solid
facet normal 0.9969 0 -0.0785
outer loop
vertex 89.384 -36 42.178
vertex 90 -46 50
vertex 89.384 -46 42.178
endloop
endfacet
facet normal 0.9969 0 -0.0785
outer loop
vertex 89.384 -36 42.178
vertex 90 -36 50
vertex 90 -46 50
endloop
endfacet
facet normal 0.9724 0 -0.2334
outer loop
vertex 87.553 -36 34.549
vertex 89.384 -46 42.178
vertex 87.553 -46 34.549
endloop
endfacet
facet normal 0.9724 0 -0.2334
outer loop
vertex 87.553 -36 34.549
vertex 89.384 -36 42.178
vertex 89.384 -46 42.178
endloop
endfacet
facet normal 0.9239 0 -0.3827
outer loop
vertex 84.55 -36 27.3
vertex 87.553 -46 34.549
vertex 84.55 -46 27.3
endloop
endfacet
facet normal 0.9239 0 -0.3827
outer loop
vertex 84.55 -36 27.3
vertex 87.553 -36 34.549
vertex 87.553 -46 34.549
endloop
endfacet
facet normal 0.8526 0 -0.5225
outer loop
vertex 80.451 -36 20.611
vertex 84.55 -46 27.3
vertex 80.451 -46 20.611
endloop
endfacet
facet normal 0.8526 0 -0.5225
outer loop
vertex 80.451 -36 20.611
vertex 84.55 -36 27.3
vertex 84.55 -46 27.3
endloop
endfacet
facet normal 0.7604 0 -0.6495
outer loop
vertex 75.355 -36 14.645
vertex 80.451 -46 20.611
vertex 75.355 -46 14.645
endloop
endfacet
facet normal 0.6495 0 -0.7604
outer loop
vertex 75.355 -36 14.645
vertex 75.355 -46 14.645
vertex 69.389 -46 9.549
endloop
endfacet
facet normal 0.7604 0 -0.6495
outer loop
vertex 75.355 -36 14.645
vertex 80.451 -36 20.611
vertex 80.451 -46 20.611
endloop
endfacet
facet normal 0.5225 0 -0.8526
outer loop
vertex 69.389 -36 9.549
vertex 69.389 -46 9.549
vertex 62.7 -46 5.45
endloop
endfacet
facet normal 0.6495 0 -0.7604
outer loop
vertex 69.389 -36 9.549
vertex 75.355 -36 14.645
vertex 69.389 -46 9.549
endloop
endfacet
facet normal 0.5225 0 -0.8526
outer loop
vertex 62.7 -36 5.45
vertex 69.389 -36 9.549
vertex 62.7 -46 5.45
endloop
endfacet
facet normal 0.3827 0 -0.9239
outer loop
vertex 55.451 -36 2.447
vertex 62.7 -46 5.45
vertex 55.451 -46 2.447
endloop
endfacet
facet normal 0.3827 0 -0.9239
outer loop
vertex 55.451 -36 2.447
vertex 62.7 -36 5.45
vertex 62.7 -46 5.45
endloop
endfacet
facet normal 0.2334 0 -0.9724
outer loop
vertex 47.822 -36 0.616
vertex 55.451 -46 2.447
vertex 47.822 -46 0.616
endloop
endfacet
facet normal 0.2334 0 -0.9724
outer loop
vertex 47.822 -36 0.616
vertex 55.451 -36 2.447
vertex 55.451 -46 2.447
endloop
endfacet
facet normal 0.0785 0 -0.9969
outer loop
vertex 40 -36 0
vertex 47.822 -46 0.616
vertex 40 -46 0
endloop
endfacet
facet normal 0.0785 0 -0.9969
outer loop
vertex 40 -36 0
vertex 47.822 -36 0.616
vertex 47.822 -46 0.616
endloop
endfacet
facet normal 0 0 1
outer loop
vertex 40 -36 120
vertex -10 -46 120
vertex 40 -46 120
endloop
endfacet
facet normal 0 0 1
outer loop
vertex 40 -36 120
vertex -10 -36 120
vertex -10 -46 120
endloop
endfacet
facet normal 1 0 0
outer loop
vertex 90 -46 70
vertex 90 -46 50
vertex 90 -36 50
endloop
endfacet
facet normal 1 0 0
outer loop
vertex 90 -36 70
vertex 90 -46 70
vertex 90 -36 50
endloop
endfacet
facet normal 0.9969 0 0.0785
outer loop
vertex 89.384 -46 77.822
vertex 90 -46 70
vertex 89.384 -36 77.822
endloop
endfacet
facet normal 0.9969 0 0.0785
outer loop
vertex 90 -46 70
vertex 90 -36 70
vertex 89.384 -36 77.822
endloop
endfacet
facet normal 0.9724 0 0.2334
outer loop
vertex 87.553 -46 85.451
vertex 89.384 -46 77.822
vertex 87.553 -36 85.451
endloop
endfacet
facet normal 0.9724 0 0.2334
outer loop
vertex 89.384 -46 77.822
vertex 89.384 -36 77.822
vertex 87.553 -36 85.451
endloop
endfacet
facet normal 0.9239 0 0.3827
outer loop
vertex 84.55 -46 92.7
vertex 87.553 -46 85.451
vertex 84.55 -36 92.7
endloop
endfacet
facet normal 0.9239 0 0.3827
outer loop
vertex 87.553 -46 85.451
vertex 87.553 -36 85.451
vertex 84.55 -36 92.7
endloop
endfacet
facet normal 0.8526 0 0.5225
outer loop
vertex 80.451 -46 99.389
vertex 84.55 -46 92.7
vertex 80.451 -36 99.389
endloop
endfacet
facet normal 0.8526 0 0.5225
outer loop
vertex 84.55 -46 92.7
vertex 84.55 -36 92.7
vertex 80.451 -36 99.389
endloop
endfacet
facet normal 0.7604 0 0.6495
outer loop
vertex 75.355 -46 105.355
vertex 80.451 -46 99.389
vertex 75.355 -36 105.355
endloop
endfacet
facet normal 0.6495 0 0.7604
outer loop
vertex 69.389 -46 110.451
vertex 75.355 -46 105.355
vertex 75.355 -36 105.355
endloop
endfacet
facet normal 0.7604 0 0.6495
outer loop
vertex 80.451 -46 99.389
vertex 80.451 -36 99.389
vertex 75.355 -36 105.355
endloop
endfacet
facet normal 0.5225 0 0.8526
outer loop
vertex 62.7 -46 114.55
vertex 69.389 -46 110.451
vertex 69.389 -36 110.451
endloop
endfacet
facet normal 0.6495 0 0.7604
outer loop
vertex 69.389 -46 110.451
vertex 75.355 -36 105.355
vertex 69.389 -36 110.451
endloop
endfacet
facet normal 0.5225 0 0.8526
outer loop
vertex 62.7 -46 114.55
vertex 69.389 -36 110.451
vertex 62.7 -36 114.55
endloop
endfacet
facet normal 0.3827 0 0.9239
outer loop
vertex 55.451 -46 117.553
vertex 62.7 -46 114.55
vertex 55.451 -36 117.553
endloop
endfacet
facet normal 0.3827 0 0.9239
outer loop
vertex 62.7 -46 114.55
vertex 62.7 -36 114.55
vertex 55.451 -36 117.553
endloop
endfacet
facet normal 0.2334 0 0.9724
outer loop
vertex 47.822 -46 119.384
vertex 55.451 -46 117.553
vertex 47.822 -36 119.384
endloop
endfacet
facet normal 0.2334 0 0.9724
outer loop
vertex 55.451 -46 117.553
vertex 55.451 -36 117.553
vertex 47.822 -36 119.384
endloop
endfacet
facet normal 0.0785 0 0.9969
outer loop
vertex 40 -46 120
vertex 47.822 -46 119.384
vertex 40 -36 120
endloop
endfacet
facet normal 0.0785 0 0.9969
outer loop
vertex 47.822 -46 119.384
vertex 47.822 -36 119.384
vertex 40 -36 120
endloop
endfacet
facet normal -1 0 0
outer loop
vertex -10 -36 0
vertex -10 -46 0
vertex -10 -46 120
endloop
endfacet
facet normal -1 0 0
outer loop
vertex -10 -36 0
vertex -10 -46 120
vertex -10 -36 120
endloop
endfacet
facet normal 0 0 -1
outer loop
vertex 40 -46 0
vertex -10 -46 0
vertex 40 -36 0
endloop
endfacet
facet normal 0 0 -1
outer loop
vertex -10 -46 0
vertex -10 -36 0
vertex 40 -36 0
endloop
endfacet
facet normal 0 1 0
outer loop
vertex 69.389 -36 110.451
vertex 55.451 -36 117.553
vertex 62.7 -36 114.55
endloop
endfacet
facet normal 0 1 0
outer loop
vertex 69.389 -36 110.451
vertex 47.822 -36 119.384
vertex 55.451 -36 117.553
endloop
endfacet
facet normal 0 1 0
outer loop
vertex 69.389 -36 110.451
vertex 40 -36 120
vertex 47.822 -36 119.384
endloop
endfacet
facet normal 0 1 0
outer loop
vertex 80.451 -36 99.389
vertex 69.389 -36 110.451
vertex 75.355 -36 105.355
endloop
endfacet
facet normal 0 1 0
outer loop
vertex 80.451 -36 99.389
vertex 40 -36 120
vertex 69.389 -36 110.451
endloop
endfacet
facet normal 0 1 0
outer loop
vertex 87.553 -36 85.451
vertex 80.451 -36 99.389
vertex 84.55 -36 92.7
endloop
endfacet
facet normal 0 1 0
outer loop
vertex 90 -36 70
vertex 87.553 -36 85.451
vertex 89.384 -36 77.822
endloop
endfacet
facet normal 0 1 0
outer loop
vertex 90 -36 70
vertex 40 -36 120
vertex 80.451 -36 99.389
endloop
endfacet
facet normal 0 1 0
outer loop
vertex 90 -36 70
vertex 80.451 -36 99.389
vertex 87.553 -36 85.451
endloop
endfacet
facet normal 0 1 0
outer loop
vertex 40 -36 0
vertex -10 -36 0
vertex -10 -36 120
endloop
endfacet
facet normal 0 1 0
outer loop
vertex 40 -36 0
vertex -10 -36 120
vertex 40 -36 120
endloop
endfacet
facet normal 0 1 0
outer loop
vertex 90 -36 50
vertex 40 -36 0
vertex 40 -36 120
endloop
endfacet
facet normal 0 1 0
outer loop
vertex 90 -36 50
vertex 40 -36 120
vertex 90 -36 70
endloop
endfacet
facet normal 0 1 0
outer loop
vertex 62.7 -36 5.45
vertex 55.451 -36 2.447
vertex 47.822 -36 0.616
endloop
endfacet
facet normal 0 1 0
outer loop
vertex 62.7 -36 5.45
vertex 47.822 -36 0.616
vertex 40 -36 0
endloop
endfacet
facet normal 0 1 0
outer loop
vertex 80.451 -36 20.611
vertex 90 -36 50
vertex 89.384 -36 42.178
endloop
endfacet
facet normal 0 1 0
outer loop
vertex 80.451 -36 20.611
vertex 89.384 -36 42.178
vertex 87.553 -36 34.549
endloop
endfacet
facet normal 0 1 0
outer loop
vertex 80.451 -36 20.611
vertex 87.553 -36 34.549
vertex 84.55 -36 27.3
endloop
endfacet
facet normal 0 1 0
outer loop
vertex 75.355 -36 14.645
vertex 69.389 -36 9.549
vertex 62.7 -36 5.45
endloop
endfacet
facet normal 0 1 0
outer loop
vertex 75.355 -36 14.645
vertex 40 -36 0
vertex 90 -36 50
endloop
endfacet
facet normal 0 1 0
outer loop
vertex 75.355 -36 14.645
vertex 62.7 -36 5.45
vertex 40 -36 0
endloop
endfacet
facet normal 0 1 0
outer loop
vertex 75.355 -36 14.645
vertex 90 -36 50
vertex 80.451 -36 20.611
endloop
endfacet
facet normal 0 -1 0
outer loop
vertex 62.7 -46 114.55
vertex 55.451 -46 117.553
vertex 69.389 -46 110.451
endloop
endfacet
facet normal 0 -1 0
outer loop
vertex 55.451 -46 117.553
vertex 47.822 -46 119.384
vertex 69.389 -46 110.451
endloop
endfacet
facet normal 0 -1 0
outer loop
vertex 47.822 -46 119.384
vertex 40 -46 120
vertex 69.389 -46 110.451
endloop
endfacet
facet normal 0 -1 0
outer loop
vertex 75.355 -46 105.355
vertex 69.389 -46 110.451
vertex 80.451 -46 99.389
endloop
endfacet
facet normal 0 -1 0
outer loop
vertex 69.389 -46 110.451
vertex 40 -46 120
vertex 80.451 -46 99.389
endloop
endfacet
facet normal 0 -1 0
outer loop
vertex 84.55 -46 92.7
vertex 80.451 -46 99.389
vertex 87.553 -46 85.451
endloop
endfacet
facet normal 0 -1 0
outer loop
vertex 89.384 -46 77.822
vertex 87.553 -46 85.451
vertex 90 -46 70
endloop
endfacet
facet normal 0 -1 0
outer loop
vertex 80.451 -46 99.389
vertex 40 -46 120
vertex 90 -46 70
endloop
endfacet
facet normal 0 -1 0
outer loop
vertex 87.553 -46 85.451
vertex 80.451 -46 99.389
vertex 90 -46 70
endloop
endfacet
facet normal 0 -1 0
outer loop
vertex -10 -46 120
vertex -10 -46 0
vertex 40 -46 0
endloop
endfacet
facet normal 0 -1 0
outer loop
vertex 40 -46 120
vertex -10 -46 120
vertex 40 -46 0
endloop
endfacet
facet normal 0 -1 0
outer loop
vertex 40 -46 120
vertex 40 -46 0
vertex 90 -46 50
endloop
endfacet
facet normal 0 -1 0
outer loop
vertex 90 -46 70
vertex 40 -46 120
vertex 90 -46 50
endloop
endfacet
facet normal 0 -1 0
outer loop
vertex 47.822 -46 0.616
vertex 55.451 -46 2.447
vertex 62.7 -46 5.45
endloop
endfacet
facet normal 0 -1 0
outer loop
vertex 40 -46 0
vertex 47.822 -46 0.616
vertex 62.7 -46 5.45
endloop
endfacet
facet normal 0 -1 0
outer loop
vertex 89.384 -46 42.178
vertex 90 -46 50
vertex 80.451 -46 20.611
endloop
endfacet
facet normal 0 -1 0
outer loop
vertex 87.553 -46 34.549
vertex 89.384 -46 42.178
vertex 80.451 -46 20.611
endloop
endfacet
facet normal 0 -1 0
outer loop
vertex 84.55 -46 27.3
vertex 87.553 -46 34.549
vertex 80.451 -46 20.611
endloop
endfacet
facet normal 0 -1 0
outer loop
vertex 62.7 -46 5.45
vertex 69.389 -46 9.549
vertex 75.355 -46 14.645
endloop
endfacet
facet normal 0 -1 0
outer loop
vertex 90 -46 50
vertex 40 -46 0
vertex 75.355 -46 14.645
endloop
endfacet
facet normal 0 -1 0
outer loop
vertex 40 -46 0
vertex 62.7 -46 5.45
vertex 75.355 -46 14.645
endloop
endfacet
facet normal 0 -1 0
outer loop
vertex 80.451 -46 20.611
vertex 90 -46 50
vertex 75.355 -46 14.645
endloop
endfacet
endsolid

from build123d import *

# Parameters (mm, degrees)
BOX014_W     = 100
BOX014_H     = 10
BOX014_DEPTH = 120
FILLET_R     = 50
FILLET001_R  = 50


with BuildPart() as part:
    # Box014 → Box014 (new body)
    with BuildSketch(Plane(origin=(-10, -46, 0), x_dir=(1, 0, 0), z_dir=(0, 0, 1))):
        with Locations((50, 5)):
            Rectangle(BOX014_W, BOX014_H)
    extrude(amount=BOX014_DEPTH)

    # Fillet
    fillet_edges = [part.edges().sort_by_distance(p)[0] for p in [
        (90, -41, 0),
    ]]
    fillet(fillet_edges, radius=FILLET_R)

    # Fillet001
    fillet001_edges = [part.edges().sort_by_distance(p)[0] for p in [
        (90, -41, 120),
    ]]
    fillet(fillet001_edges, radius=FILLET001_R)


solid = part.part
